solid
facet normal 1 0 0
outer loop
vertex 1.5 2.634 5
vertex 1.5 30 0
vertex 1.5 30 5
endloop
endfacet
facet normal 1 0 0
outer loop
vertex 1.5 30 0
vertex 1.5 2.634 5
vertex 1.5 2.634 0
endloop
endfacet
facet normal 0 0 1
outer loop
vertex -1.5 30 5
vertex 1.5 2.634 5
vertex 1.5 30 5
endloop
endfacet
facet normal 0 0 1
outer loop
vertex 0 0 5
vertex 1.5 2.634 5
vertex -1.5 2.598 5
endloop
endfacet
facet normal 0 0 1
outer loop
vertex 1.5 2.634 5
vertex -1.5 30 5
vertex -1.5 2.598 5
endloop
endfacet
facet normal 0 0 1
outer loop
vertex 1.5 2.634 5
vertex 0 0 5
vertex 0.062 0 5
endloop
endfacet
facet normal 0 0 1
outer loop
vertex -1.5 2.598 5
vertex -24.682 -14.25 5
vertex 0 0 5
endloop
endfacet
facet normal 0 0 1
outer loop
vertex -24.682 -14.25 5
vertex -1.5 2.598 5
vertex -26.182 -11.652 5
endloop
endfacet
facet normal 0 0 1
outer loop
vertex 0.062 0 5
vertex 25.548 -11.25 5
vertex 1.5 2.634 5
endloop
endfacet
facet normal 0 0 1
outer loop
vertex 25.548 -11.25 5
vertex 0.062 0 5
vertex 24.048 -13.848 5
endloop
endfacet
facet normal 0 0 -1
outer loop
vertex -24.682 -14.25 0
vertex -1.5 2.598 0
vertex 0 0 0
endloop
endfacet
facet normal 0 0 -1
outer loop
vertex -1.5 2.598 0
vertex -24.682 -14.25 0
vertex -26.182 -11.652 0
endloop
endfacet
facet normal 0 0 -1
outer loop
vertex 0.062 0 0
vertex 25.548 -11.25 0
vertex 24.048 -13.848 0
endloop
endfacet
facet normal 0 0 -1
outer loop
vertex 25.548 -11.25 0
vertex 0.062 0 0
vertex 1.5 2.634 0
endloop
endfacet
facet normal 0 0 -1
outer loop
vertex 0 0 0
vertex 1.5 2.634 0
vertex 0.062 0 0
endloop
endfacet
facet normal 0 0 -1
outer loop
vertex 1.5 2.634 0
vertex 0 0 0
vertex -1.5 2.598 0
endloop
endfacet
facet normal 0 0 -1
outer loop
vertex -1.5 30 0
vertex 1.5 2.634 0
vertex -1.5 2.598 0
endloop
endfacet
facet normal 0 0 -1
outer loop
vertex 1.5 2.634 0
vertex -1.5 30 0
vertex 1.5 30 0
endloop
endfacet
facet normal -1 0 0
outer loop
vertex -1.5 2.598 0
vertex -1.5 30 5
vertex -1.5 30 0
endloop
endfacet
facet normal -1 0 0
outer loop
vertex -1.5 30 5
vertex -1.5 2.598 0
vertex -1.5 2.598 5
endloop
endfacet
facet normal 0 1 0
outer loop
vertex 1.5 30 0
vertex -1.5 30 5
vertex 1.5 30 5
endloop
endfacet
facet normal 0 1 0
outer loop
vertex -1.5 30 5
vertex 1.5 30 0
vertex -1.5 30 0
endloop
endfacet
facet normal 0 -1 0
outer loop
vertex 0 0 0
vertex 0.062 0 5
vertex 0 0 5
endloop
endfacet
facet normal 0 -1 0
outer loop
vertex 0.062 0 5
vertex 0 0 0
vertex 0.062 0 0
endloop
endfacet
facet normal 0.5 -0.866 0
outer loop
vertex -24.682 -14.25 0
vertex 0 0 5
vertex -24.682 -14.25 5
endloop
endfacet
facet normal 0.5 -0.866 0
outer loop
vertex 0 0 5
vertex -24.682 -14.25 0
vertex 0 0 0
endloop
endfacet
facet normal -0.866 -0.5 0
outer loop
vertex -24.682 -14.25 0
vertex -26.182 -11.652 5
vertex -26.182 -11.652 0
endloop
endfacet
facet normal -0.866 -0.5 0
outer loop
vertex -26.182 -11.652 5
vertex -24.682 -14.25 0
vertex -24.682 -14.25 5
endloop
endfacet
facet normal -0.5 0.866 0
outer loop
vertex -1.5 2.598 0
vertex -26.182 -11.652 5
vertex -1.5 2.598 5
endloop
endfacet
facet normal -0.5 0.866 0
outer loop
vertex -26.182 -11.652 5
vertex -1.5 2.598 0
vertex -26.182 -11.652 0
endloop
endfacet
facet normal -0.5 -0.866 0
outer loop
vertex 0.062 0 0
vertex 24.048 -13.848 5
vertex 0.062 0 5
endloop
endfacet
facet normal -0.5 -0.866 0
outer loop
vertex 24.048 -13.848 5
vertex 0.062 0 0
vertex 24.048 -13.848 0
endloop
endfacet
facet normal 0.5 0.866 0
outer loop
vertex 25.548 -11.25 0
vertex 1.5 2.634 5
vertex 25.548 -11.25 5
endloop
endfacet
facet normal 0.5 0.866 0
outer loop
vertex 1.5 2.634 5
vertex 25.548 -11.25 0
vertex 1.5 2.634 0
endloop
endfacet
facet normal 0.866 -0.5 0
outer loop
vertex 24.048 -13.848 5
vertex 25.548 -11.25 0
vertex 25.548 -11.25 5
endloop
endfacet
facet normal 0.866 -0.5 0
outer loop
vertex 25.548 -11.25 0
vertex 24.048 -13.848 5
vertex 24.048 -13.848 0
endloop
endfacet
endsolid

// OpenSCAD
w = 3;
radius = 30;

translate([-w / 2, 0, 0]) cube([w, radius, 5]);
translate([0, 0, 0]) rotate([0, 0, 120]) cube([w, radius - (w / 2), 5]);
translate([(w * sin(30) / sin(60)) / 2 , w, 0]) rotate([0, 0, 240]) cube([w, radius - (w / 2), 5]);
